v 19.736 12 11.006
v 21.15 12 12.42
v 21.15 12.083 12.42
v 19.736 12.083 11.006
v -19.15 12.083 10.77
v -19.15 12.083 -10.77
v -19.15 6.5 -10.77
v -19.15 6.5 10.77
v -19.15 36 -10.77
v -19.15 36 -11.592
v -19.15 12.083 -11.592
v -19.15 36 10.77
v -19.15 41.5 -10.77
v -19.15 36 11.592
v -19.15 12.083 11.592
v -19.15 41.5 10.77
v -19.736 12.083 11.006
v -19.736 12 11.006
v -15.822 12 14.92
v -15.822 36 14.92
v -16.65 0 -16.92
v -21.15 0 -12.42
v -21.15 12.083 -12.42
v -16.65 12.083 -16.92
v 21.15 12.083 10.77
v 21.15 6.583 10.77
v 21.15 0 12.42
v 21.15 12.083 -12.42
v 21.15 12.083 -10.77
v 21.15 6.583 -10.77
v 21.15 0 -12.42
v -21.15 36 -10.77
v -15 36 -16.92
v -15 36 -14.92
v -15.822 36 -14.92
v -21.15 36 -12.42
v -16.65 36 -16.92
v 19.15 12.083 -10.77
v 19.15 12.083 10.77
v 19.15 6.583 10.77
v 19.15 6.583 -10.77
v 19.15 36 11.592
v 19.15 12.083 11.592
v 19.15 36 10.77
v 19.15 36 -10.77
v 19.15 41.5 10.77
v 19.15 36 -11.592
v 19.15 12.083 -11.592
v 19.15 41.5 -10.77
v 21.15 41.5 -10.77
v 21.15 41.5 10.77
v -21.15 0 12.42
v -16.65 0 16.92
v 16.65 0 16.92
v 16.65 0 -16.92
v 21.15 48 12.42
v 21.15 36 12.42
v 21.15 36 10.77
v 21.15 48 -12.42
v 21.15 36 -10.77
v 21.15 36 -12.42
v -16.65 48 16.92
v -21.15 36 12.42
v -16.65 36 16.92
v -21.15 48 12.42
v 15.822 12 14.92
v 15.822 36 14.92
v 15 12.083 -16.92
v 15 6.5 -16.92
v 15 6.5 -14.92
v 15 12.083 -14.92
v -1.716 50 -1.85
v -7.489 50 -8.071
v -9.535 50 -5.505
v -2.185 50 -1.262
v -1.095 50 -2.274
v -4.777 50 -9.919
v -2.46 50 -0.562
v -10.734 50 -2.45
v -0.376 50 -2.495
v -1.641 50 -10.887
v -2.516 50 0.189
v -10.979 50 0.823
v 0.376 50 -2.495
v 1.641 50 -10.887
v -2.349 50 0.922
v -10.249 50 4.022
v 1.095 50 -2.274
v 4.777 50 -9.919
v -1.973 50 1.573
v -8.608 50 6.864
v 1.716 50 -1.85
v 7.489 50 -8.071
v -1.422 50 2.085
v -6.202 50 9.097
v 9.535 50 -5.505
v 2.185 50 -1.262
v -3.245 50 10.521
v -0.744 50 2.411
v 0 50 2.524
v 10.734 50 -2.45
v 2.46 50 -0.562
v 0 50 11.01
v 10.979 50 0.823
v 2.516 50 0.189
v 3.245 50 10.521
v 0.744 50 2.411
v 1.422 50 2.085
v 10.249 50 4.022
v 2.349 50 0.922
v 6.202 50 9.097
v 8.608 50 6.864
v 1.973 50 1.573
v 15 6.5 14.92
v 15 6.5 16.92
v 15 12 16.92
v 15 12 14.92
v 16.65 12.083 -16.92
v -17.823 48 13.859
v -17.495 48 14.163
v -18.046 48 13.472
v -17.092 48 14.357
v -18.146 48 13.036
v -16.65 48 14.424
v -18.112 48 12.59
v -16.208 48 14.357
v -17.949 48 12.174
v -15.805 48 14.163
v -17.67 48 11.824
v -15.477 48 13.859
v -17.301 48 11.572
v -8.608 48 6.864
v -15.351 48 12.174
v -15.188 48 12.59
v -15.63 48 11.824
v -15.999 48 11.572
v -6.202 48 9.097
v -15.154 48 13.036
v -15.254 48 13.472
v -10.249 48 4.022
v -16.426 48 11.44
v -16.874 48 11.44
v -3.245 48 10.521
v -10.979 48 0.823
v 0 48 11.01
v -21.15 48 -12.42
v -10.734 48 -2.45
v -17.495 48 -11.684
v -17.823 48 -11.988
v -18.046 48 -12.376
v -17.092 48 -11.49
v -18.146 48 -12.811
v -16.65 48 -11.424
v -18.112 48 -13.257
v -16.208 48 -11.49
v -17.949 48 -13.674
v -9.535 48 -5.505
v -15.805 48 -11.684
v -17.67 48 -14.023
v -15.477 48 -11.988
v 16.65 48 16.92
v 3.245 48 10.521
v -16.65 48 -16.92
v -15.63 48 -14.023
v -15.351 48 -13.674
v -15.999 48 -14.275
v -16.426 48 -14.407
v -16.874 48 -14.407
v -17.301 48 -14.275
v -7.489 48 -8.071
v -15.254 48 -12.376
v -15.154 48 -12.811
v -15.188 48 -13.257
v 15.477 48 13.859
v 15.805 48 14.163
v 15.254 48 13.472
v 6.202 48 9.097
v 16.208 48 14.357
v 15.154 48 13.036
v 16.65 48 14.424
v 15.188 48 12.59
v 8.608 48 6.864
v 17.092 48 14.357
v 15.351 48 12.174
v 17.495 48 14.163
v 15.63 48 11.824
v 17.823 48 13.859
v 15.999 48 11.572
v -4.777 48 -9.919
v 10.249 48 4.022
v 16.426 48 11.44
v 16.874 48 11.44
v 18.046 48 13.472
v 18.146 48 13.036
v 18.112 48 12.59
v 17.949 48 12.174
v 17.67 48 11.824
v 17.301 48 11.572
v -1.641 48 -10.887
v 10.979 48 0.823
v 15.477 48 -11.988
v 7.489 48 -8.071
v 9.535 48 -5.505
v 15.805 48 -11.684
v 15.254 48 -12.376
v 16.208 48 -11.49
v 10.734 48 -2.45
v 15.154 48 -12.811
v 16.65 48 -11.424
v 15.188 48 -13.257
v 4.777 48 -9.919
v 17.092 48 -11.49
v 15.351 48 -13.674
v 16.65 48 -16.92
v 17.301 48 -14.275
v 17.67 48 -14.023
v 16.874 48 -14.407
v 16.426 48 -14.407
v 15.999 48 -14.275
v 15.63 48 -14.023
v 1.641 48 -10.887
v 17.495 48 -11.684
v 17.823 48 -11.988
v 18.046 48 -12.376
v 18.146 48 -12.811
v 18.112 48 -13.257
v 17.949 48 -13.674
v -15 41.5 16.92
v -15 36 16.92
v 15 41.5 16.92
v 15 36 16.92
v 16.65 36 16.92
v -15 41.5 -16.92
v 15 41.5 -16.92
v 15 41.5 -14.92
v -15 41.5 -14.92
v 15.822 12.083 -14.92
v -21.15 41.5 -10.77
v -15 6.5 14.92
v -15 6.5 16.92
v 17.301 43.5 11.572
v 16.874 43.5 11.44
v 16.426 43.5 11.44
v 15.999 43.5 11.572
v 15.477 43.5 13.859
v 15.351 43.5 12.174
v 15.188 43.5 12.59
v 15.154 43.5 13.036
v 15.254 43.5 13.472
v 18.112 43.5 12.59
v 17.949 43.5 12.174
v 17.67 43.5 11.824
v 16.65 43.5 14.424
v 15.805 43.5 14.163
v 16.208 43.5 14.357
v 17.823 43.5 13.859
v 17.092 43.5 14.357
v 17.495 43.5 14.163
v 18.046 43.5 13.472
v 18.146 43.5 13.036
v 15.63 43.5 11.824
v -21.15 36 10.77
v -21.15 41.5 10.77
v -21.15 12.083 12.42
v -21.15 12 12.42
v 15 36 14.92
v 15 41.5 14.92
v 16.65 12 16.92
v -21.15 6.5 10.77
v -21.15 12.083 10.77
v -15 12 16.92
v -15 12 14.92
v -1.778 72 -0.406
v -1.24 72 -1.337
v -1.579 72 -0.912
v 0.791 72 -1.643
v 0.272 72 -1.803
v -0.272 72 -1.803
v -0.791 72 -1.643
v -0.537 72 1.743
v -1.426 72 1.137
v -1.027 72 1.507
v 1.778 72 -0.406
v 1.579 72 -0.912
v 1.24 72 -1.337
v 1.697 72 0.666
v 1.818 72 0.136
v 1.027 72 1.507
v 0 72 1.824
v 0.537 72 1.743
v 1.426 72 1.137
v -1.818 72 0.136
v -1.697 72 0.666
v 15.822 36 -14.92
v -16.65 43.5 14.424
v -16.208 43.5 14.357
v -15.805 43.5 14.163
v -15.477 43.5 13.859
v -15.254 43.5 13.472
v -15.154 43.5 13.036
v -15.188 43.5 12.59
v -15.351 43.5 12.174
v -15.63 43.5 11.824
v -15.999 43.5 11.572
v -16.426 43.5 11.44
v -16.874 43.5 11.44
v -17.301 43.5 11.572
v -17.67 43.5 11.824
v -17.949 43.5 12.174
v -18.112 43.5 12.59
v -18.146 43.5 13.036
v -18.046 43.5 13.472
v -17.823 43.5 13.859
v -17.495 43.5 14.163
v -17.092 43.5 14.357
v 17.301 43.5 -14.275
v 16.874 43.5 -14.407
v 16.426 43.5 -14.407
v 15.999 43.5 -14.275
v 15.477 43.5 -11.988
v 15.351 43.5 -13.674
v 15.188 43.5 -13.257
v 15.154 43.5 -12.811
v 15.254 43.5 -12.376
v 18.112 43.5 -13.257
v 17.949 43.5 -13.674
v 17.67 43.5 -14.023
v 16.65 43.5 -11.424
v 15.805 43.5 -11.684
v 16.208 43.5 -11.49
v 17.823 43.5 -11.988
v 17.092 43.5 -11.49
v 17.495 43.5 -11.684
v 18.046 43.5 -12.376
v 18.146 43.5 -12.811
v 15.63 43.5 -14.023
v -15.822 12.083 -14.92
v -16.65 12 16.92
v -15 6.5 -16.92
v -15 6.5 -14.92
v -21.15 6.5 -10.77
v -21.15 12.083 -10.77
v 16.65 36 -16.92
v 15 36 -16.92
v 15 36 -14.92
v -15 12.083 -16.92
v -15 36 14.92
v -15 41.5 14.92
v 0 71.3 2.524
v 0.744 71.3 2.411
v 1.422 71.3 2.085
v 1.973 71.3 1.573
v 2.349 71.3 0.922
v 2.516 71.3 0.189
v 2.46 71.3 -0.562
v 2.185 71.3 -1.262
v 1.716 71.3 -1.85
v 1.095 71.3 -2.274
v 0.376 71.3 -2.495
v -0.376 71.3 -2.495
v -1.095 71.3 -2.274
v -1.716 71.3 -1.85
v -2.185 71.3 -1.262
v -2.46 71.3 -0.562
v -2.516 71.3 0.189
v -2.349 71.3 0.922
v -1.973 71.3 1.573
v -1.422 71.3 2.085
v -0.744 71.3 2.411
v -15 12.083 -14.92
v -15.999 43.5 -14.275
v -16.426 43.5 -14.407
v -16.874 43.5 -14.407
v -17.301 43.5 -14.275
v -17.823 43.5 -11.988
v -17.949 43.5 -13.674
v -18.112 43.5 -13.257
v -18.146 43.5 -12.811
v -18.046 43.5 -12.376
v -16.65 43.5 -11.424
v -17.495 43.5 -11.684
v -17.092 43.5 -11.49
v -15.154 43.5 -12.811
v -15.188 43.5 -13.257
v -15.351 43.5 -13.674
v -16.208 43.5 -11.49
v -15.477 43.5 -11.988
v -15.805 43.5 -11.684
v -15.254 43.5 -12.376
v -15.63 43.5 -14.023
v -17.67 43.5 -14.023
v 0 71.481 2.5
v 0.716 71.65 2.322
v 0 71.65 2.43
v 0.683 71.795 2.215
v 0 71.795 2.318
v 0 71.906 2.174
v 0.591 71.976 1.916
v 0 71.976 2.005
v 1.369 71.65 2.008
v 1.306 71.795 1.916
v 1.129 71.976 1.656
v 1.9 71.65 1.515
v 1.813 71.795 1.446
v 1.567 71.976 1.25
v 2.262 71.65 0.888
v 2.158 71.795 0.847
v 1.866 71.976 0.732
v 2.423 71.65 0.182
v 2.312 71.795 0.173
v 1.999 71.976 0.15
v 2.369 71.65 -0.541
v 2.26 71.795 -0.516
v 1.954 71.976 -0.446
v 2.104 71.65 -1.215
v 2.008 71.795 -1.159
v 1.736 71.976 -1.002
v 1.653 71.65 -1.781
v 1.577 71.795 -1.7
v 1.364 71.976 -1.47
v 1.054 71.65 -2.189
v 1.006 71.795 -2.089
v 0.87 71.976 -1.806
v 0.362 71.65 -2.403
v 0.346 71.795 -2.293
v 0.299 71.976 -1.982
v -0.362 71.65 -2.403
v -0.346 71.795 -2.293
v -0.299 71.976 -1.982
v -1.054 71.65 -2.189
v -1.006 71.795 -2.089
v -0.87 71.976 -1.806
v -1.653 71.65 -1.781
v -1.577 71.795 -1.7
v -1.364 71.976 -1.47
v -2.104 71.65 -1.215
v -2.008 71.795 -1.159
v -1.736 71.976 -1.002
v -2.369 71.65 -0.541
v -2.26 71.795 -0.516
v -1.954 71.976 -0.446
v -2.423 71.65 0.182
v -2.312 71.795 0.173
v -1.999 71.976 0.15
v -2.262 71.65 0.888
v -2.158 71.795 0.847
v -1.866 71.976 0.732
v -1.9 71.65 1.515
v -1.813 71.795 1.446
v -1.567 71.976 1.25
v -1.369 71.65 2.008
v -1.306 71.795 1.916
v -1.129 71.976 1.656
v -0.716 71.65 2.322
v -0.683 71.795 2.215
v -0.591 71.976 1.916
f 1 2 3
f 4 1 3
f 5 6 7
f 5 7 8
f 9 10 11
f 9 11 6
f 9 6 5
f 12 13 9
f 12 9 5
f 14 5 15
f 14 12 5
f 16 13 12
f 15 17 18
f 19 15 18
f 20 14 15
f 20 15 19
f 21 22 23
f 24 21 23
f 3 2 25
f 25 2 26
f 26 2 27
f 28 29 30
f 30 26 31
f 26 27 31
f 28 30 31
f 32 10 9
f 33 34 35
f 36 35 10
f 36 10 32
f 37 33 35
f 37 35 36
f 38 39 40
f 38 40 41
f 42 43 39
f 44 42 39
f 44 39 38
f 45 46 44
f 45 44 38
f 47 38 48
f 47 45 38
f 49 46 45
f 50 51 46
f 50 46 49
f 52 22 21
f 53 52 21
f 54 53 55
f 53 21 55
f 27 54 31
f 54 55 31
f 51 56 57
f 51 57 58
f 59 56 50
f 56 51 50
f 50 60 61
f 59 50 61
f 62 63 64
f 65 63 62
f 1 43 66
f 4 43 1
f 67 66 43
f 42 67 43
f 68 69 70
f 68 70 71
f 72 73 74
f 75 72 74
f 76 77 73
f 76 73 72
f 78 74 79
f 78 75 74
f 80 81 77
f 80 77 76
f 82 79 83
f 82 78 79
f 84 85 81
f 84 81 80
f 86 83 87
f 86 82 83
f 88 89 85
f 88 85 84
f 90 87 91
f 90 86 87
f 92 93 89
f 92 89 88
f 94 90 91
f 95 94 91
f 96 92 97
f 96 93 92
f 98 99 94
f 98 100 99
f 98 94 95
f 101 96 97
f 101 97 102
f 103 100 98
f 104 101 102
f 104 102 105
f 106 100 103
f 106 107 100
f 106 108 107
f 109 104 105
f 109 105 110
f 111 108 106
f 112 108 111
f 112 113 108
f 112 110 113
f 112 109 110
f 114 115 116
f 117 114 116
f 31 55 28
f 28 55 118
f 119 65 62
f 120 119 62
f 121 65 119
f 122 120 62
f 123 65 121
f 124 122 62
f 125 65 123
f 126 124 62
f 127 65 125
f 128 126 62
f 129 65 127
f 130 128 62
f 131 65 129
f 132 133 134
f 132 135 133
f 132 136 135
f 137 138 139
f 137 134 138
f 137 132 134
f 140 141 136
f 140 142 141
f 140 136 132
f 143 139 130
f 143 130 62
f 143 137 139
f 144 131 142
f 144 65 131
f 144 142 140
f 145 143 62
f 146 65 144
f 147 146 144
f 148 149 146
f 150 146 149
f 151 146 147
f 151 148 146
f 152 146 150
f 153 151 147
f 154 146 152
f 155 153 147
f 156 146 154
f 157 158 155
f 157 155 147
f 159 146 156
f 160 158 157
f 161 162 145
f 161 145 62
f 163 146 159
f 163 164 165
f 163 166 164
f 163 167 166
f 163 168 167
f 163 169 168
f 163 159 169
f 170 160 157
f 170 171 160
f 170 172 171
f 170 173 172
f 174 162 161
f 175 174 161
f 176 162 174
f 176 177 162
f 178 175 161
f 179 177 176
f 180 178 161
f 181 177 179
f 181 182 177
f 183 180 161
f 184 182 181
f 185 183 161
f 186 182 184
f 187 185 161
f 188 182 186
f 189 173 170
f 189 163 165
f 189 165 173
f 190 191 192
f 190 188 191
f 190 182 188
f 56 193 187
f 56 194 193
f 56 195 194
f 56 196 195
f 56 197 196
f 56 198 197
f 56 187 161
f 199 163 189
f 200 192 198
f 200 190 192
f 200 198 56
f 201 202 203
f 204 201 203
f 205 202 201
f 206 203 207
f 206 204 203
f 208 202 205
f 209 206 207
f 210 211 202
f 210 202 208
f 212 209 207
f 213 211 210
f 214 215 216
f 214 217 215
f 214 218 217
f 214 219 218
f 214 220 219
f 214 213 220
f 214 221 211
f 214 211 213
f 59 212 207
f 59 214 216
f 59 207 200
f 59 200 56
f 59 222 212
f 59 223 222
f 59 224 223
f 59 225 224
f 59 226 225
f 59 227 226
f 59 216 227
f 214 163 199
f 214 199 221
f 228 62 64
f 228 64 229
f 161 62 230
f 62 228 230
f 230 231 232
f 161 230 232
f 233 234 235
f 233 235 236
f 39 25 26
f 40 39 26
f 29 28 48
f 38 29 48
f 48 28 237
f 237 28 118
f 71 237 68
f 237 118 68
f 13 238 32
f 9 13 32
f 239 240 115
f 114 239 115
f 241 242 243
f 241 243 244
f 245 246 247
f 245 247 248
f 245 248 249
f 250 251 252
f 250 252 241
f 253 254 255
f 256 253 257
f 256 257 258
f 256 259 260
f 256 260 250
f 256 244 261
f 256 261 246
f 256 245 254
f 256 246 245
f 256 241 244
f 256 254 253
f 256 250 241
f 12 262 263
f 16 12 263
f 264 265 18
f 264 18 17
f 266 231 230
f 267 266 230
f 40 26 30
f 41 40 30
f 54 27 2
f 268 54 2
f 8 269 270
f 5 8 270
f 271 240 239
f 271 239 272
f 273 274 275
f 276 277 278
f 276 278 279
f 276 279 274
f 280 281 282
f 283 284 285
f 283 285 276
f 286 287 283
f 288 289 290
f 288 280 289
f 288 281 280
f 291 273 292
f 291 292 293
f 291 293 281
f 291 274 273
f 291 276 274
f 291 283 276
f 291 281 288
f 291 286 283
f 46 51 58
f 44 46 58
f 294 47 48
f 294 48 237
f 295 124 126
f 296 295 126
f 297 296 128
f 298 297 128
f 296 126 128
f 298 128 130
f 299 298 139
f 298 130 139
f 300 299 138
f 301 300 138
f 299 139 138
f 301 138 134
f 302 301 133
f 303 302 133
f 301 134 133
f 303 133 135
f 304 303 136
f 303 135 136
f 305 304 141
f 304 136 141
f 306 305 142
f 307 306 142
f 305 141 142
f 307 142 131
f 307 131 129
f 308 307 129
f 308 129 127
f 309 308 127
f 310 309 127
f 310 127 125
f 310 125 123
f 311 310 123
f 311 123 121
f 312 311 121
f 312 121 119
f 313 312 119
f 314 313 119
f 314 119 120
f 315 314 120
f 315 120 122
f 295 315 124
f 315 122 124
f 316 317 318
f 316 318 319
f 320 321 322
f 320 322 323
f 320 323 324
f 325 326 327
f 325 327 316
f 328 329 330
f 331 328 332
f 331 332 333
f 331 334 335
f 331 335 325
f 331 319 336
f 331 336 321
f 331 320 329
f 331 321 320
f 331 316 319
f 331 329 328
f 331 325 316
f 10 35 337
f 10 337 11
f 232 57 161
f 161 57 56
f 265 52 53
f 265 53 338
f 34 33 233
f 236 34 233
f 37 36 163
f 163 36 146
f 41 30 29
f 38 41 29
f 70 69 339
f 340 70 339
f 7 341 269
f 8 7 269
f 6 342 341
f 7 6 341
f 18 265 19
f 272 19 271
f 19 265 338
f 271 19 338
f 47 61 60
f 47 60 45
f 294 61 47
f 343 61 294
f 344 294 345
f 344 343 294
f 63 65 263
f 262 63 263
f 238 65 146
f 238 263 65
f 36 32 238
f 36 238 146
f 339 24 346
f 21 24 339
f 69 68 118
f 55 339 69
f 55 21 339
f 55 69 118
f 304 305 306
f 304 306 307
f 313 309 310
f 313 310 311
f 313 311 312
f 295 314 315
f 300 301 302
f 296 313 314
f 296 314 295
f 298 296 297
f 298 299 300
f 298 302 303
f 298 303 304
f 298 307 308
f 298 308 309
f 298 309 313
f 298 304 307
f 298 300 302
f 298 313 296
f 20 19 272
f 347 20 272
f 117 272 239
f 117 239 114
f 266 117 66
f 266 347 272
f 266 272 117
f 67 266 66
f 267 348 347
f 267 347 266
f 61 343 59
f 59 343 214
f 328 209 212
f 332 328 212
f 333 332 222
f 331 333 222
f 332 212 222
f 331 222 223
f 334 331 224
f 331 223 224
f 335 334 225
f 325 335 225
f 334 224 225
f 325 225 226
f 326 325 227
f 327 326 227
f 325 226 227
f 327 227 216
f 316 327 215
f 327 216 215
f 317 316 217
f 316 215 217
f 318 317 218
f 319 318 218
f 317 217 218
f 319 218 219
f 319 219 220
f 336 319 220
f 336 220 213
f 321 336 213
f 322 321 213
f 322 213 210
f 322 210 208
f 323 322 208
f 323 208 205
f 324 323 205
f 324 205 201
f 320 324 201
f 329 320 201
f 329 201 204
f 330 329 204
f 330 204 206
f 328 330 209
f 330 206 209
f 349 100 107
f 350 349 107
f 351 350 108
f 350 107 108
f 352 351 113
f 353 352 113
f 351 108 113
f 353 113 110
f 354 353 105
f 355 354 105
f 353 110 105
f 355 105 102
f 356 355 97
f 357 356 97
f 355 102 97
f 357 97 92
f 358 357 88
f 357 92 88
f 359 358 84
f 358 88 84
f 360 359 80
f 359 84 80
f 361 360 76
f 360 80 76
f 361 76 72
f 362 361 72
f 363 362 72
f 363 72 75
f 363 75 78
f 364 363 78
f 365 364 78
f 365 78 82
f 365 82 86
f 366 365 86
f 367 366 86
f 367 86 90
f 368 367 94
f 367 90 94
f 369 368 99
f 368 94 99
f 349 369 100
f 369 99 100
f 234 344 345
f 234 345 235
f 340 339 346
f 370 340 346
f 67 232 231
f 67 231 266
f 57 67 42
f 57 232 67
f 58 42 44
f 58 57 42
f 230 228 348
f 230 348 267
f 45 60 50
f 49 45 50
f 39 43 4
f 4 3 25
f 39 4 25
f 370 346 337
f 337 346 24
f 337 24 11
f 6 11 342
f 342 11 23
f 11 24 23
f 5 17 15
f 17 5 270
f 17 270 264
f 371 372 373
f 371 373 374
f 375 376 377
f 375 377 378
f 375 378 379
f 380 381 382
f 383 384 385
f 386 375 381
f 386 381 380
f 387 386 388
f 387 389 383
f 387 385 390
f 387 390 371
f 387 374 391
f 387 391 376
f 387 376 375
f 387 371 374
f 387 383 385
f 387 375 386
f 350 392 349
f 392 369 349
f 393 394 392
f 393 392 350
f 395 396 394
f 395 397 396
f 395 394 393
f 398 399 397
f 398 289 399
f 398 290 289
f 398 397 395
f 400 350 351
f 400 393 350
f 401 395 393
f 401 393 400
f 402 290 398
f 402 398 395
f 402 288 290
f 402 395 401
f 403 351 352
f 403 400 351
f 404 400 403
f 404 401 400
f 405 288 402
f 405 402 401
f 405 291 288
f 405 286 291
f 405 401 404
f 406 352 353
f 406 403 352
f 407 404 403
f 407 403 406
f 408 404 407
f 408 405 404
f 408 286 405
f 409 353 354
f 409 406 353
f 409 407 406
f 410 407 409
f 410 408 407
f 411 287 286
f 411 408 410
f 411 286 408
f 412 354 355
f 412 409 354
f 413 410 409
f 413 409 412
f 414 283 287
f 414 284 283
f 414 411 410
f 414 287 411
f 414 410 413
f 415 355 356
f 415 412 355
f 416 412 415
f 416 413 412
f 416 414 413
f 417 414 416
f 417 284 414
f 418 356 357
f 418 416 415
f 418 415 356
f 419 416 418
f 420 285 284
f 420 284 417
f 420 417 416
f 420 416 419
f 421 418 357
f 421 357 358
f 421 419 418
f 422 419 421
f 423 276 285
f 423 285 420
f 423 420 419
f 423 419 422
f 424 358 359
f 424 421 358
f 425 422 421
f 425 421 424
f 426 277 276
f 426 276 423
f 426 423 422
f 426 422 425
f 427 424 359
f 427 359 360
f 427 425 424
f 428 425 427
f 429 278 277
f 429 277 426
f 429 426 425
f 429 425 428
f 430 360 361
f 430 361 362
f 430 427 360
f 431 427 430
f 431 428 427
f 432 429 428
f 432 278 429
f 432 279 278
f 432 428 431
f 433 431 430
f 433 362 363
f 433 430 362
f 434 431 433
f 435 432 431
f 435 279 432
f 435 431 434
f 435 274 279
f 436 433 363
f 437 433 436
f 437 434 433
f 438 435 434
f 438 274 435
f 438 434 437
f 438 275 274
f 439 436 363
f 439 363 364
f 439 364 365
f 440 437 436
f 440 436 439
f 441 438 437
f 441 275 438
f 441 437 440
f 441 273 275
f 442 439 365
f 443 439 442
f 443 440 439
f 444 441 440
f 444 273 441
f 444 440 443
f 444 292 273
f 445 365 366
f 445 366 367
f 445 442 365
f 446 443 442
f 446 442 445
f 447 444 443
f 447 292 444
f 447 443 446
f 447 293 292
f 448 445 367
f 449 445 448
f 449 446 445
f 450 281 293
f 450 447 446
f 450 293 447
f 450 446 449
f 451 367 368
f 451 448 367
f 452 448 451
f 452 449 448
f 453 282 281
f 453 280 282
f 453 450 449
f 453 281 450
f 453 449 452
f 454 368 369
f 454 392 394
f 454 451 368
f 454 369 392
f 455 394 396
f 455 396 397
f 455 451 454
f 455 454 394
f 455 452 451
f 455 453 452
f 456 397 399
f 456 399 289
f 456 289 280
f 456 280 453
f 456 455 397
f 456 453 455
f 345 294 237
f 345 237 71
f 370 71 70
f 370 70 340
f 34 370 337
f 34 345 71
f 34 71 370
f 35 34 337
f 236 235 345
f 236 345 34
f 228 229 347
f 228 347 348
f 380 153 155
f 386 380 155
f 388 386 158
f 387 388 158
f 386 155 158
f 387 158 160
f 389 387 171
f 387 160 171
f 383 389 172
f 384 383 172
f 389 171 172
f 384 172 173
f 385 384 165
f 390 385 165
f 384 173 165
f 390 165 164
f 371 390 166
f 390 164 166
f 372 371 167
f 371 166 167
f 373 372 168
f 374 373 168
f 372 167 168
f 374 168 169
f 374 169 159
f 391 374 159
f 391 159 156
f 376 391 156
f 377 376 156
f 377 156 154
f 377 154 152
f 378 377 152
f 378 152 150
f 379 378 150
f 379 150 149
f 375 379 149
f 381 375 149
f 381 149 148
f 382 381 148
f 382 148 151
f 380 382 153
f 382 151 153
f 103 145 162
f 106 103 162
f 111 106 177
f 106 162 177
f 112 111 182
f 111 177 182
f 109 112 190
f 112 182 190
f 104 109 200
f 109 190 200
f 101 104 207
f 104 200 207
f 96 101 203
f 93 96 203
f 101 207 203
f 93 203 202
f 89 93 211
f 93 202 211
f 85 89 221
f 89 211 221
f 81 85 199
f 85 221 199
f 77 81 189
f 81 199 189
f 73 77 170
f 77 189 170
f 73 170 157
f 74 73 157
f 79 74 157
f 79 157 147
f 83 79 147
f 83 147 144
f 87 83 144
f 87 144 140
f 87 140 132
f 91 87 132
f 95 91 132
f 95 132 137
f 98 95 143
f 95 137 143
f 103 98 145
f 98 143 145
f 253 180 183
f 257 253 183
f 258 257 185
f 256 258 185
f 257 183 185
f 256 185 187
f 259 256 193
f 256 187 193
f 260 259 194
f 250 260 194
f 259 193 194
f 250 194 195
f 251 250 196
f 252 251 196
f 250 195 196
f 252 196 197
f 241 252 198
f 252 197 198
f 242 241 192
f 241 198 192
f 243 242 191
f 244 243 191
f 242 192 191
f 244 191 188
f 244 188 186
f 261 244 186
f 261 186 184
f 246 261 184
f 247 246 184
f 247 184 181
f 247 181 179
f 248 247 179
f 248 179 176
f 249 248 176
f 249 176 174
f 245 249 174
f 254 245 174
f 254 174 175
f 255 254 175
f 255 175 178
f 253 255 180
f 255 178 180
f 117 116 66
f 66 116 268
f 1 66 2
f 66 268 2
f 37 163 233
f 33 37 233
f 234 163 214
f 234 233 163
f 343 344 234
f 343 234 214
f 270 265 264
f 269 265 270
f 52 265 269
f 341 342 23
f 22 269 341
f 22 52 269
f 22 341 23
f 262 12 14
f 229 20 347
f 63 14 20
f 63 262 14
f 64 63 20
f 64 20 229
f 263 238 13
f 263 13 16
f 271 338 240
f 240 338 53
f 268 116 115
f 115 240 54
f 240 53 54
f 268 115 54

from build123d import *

# Parameters (mm, degrees)
SKETCH1_W           = 42.3
SKETCH1_H           = 33.84
BOSS_EXTRUDE1_DEPTH = 48
SKETCH2_R           = 11.009712126
BOSS_EXTRUDE2_DEPTH = 2
CHAMFER1_SIZE       = 4.5
CHAMFER2_SIZE       = 4.5
CHAMFER3_SIZE       = 4.5
CHAMFER4_SIZE       = 4.5
SKETCH3_R           = 2.52352428
BOSS_EXTRUDE3_DEPTH = 22
SKETCH4_R           = 1.5
CUT_EXTRUDE1_DEPTH  = 4.5
FILLET4_R           = 0.7
SKETCH5_W           = 30
SKETCH5_H           = 35
SKETCH5_W_2         = 1.65
SKETCH5_H_2         = 24
CUT_EXTRUDE2_DEPTH  = 2
SKETCH6_W           = 6.363961031
SKETCH6_H           = 24
CUT_EXTRUDE4_DEPTH  = 2
SKETCH8_W           = 21.54
SKETCH8_H           = 5.5
SKETCH8_H_2         = 23.916619391
SKETCH8_W_2         = 1.65
CUT_EXTRUDE5_DEPTH  = 2
SKETCH9_W           = 6.363961031
SKETCH9_H           = 23.916619391
CUT_EXTRUDE7_DEPTH  = 2
SKETCH10_W          = 33.3
SKETCH10_H          = 23.916619391
CUT_EXTRUDE8_DEPTH  = 2
SKETCH11_W          = 30
SKETCH11_H          = 35
CUT_EXTRUDE10_DEPTH = 2
SKETCH12_W          = 6.363961031
SKETCH12_H          = 23.916619391
CUT_EXTRUDE11_DEPTH = 2
SKETCH13_W          = 6.363961031
SKETCH13_H          = 24
CUT_EXTRUDE12_DEPTH = 2
SKETCH14_W          = 21.54
SKETCH14_H          = 5.5
SKETCH14_H_2        = 23.916619391
SKETCH14_H_3        = 5.583380609
SKETCH14_W_2        = 1.65
CUT_EXTRUDE13_DEPTH = 2


with BuildPart() as part:
    # Sketch1 → Boss-Extrude1 (new body)
    with BuildSketch(Plane(origin=(0, 0, 0), x_dir=(1, 0, 0), z_dir=(0, 1, 0))):
        Rectangle(SKETCH1_W, SKETCH1_H)
    extrude(amount=BOSS_EXTRUDE1_DEPTH)

    # Sketch2 → Boss-Extrude2 (add)
    with BuildSketch(Plane(origin=(0, 48, 0), x_dir=(1, 0, 0), z_dir=(0, 1, 0))):
        with Locations(Location((0, 0, 0), (0, 0, 270))):
            Circle(SKETCH2_R)
    extrude(amount=BOSS_EXTRUDE2_DEPTH)

    # Chamfer1
    chamfer1_edges = [part.edges().sort_by_distance(p)[0] for p in [
        (21.15, 24, 16.92),
    ]]
    chamfer(chamfer1_edges, length=CHAMFER1_SIZE)

    # Chamfer2
    chamfer2_edges = [part.edges().sort_by_distance(p)[0] for p in [
        (-21.15, 24, 16.92),
    ]]
    chamfer(chamfer2_edges, length=CHAMFER2_SIZE)

    # Chamfer3
    chamfer3_edges = [part.edges().sort_by_distance(p)[0] for p in [
        (21.15, 24, -16.92),
    ]]
    chamfer(chamfer3_edges, length=CHAMFER3_SIZE)

    # Chamfer4
    chamfer4_edges = [part.edges().sort_by_distance(p)[0] for p in [
        (-21.15, 24, -16.92),
    ]]
    chamfer(chamfer4_edges, length=CHAMFER4_SIZE)

    # Sketch3 → Boss-Extrude3 (add)
    with BuildSketch(Plane(origin=(0, 50, 0), x_dir=(1, 0, 0), z_dir=(0, 1, 0))):
        with Locations(Location((0, 0, 0), (0, 0, 270))):
            Circle(SKETCH3_R)
    extrude(amount=BOSS_EXTRUDE3_DEPTH)

    # Sketch4 → Cut-Extrude1 (cut)
    with BuildSketch(Plane(origin=(0, 48, 0), x_dir=(1, 0, 0), z_dir=(0, 1, 0))):
        with Locations(Location((-16.65, -12.923571429, 0), (0, 0, 270))):
            Circle(SKETCH4_R)
        with Locations(Location((-16.65, 12.923571429, 0), (0, 0, 270))):
            Circle(SKETCH4_R)
        with Locations(Location((16.65, 12.923571429, 0), (0, 0, 270))):
            Circle(SKETCH4_R)
        with Locations(Location((16.65, -12.923571429, 0), (0, 0, 270))):
            Circle(SKETCH4_R)
    extrude(amount=-CUT_EXTRUDE1_DEPTH, mode=Mode.SUBTRACT)

    # Fillet4
    fillet4_edges = [part.edges().sort_by_distance(p)[0] for p in [
        (0, 72, -2.52352428),
    ]]
    fillet(fillet4_edges, radius=FILLET4_R)

    # Sketch5 → Cut-Extrude2 (cut)
    with BuildSketch(Plane.XY.offset(16.92)):
        with Locations((0, 24)):
            Rectangle(SKETCH5_W, SKETCH5_H)
        with Locations((15.825, 24)):
            Rectangle(SKETCH5_W_2, SKETCH5_H_2)
        with Locations((-15.825, 24)):
            Rectangle(SKETCH5_W_2, SKETCH5_H_2)
    extrude(amount=-CUT_EXTRUDE2_DEPTH, mode=Mode.SUBTRACT)

    # Sketch6 → Cut-Extrude4 (cut)
    with BuildSketch(Plane(origin=(16.785, 0, 16.785), x_dir=(0.707106781186549, 0, -0.707106781186546), z_dir=(0.707106781186546, 0, 0.707106781186549))):
        with Locations((2.991061684, 24)):
            Rectangle(SKETCH6_W, SKETCH6_H)
    extrude(amount=-CUT_EXTRUDE4_DEPTH, mode=Mode.SUBTRACT)

    # Sketch8 → Cut-Extrude5 (cut)
    with BuildSketch(Plane(origin=(21.15, 0, 0), x_dir=(0, 0, -1), z_dir=(1, 0, 0))):
        with Locations((0, 38.75)):
            Rectangle(SKETCH8_W, SKETCH8_H)
        with Locations((0, 24.041690305)):
            Rectangle(SKETCH8_W, SKETCH8_H_2)
        with Locations((0, 9.333380609)):
            Rectangle(SKETCH8_W, SKETCH8_H)
        with Locations((11.595, 24.041690305)):
            Rectangle(SKETCH8_W_2, SKETCH8_H_2)
        with Locations((-11.595, 24.041690305)):
            Rectangle(SKETCH8_W_2, SKETCH8_H_2)
    extrude(amount=-CUT_EXTRUDE5_DEPTH, mode=Mode.SUBTRACT)

    # Sketch9 → Cut-Extrude7 (cut)
    with BuildSketch(Plane(origin=(16.785, 0, -16.785), x_dir=(-0.707106781186546, 0, -0.7071067811865491), z_dir=(0.7071067811865491, 0, -0.707106781186546))):
        with Locations((-2.991061684, 24.041690305)):
            Rectangle(SKETCH9_W, SKETCH9_H)
    extrude(amount=-CUT_EXTRUDE7_DEPTH, mode=Mode.SUBTRACT)

    # Sketch10 → Cut-Extrude8 (cut)
    with BuildSketch(Plane(origin=(0, 0, -16.92), x_dir=(-1, 0, 0), z_dir=(0, 0, -1))):
        with Locations((0, 24.041690305)):
            Rectangle(SKETCH10_W, SKETCH10_H)
    extrude(amount=-CUT_EXTRUDE8_DEPTH, mode=Mode.SUBTRACT)

    # Sketch11 → Cut-Extrude10 (cut)
    with BuildSketch(Plane(origin=(0, 0, -16.92), x_dir=(-1, 0, 0), z_dir=(0, 0, -1))):
        with Locations((0, 24)):
            Rectangle(SKETCH11_W, SKETCH11_H)
    extrude(amount=-CUT_EXTRUDE10_DEPTH, mode=Mode.SUBTRACT)

    # Sketch12 → Cut-Extrude11 (cut)
    with BuildSketch(Plane(origin=(-16.785, 0, -16.785), x_dir=(-0.7071067811865491, 0, 0.707106781186546), z_dir=(-0.707106781186546, 0, -0.7071067811865491))):
        with Locations((2.991061684, 24.041690305)):
            Rectangle(SKETCH12_W, SKETCH12_H)
    extrude(amount=-CUT_EXTRUDE11_DEPTH, mode=Mode.SUBTRACT)

    # Sketch13 → Cut-Extrude12 (cut)
    with BuildSketch(Plane(origin=(-16.785, 0, 16.785), x_dir=(0.7071067811865465, 0, 0.7071067811865486), z_dir=(-0.7071067811865486, 0, 0.7071067811865465))):
        with Locations((-2.991061684, 24)):
            Rectangle(SKETCH13_W, SKETCH13_H)
    extrude(amount=-CUT_EXTRUDE12_DEPTH, mode=Mode.SUBTRACT)

    # Sketch14 → Cut-Extrude13 (cut)
    with BuildSketch(Plane.ZY.offset(21.15)):
        with Locations((0, 38.75)):
            Rectangle(SKETCH14_W, SKETCH14_H)
        with Locations((0, 24.041690305)):
            Rectangle(SKETCH14_W, SKETCH14_H_2)
        with Locations((0, 9.291690305)):
            Rectangle(SKETCH14_W, SKETCH14_H_3)
        with Locations((11.595, 24.041690305)):
            Rectangle(SKETCH14_W_2, SKETCH14_H_2)
        with Locations((-11.595, 24.041690305)):
            Rectangle(SKETCH14_W_2, SKETCH14_H_2)
    extrude(amount=-CUT_EXTRUDE13_DEPTH, mode=Mode.SUBTRACT)


solid = part.part
